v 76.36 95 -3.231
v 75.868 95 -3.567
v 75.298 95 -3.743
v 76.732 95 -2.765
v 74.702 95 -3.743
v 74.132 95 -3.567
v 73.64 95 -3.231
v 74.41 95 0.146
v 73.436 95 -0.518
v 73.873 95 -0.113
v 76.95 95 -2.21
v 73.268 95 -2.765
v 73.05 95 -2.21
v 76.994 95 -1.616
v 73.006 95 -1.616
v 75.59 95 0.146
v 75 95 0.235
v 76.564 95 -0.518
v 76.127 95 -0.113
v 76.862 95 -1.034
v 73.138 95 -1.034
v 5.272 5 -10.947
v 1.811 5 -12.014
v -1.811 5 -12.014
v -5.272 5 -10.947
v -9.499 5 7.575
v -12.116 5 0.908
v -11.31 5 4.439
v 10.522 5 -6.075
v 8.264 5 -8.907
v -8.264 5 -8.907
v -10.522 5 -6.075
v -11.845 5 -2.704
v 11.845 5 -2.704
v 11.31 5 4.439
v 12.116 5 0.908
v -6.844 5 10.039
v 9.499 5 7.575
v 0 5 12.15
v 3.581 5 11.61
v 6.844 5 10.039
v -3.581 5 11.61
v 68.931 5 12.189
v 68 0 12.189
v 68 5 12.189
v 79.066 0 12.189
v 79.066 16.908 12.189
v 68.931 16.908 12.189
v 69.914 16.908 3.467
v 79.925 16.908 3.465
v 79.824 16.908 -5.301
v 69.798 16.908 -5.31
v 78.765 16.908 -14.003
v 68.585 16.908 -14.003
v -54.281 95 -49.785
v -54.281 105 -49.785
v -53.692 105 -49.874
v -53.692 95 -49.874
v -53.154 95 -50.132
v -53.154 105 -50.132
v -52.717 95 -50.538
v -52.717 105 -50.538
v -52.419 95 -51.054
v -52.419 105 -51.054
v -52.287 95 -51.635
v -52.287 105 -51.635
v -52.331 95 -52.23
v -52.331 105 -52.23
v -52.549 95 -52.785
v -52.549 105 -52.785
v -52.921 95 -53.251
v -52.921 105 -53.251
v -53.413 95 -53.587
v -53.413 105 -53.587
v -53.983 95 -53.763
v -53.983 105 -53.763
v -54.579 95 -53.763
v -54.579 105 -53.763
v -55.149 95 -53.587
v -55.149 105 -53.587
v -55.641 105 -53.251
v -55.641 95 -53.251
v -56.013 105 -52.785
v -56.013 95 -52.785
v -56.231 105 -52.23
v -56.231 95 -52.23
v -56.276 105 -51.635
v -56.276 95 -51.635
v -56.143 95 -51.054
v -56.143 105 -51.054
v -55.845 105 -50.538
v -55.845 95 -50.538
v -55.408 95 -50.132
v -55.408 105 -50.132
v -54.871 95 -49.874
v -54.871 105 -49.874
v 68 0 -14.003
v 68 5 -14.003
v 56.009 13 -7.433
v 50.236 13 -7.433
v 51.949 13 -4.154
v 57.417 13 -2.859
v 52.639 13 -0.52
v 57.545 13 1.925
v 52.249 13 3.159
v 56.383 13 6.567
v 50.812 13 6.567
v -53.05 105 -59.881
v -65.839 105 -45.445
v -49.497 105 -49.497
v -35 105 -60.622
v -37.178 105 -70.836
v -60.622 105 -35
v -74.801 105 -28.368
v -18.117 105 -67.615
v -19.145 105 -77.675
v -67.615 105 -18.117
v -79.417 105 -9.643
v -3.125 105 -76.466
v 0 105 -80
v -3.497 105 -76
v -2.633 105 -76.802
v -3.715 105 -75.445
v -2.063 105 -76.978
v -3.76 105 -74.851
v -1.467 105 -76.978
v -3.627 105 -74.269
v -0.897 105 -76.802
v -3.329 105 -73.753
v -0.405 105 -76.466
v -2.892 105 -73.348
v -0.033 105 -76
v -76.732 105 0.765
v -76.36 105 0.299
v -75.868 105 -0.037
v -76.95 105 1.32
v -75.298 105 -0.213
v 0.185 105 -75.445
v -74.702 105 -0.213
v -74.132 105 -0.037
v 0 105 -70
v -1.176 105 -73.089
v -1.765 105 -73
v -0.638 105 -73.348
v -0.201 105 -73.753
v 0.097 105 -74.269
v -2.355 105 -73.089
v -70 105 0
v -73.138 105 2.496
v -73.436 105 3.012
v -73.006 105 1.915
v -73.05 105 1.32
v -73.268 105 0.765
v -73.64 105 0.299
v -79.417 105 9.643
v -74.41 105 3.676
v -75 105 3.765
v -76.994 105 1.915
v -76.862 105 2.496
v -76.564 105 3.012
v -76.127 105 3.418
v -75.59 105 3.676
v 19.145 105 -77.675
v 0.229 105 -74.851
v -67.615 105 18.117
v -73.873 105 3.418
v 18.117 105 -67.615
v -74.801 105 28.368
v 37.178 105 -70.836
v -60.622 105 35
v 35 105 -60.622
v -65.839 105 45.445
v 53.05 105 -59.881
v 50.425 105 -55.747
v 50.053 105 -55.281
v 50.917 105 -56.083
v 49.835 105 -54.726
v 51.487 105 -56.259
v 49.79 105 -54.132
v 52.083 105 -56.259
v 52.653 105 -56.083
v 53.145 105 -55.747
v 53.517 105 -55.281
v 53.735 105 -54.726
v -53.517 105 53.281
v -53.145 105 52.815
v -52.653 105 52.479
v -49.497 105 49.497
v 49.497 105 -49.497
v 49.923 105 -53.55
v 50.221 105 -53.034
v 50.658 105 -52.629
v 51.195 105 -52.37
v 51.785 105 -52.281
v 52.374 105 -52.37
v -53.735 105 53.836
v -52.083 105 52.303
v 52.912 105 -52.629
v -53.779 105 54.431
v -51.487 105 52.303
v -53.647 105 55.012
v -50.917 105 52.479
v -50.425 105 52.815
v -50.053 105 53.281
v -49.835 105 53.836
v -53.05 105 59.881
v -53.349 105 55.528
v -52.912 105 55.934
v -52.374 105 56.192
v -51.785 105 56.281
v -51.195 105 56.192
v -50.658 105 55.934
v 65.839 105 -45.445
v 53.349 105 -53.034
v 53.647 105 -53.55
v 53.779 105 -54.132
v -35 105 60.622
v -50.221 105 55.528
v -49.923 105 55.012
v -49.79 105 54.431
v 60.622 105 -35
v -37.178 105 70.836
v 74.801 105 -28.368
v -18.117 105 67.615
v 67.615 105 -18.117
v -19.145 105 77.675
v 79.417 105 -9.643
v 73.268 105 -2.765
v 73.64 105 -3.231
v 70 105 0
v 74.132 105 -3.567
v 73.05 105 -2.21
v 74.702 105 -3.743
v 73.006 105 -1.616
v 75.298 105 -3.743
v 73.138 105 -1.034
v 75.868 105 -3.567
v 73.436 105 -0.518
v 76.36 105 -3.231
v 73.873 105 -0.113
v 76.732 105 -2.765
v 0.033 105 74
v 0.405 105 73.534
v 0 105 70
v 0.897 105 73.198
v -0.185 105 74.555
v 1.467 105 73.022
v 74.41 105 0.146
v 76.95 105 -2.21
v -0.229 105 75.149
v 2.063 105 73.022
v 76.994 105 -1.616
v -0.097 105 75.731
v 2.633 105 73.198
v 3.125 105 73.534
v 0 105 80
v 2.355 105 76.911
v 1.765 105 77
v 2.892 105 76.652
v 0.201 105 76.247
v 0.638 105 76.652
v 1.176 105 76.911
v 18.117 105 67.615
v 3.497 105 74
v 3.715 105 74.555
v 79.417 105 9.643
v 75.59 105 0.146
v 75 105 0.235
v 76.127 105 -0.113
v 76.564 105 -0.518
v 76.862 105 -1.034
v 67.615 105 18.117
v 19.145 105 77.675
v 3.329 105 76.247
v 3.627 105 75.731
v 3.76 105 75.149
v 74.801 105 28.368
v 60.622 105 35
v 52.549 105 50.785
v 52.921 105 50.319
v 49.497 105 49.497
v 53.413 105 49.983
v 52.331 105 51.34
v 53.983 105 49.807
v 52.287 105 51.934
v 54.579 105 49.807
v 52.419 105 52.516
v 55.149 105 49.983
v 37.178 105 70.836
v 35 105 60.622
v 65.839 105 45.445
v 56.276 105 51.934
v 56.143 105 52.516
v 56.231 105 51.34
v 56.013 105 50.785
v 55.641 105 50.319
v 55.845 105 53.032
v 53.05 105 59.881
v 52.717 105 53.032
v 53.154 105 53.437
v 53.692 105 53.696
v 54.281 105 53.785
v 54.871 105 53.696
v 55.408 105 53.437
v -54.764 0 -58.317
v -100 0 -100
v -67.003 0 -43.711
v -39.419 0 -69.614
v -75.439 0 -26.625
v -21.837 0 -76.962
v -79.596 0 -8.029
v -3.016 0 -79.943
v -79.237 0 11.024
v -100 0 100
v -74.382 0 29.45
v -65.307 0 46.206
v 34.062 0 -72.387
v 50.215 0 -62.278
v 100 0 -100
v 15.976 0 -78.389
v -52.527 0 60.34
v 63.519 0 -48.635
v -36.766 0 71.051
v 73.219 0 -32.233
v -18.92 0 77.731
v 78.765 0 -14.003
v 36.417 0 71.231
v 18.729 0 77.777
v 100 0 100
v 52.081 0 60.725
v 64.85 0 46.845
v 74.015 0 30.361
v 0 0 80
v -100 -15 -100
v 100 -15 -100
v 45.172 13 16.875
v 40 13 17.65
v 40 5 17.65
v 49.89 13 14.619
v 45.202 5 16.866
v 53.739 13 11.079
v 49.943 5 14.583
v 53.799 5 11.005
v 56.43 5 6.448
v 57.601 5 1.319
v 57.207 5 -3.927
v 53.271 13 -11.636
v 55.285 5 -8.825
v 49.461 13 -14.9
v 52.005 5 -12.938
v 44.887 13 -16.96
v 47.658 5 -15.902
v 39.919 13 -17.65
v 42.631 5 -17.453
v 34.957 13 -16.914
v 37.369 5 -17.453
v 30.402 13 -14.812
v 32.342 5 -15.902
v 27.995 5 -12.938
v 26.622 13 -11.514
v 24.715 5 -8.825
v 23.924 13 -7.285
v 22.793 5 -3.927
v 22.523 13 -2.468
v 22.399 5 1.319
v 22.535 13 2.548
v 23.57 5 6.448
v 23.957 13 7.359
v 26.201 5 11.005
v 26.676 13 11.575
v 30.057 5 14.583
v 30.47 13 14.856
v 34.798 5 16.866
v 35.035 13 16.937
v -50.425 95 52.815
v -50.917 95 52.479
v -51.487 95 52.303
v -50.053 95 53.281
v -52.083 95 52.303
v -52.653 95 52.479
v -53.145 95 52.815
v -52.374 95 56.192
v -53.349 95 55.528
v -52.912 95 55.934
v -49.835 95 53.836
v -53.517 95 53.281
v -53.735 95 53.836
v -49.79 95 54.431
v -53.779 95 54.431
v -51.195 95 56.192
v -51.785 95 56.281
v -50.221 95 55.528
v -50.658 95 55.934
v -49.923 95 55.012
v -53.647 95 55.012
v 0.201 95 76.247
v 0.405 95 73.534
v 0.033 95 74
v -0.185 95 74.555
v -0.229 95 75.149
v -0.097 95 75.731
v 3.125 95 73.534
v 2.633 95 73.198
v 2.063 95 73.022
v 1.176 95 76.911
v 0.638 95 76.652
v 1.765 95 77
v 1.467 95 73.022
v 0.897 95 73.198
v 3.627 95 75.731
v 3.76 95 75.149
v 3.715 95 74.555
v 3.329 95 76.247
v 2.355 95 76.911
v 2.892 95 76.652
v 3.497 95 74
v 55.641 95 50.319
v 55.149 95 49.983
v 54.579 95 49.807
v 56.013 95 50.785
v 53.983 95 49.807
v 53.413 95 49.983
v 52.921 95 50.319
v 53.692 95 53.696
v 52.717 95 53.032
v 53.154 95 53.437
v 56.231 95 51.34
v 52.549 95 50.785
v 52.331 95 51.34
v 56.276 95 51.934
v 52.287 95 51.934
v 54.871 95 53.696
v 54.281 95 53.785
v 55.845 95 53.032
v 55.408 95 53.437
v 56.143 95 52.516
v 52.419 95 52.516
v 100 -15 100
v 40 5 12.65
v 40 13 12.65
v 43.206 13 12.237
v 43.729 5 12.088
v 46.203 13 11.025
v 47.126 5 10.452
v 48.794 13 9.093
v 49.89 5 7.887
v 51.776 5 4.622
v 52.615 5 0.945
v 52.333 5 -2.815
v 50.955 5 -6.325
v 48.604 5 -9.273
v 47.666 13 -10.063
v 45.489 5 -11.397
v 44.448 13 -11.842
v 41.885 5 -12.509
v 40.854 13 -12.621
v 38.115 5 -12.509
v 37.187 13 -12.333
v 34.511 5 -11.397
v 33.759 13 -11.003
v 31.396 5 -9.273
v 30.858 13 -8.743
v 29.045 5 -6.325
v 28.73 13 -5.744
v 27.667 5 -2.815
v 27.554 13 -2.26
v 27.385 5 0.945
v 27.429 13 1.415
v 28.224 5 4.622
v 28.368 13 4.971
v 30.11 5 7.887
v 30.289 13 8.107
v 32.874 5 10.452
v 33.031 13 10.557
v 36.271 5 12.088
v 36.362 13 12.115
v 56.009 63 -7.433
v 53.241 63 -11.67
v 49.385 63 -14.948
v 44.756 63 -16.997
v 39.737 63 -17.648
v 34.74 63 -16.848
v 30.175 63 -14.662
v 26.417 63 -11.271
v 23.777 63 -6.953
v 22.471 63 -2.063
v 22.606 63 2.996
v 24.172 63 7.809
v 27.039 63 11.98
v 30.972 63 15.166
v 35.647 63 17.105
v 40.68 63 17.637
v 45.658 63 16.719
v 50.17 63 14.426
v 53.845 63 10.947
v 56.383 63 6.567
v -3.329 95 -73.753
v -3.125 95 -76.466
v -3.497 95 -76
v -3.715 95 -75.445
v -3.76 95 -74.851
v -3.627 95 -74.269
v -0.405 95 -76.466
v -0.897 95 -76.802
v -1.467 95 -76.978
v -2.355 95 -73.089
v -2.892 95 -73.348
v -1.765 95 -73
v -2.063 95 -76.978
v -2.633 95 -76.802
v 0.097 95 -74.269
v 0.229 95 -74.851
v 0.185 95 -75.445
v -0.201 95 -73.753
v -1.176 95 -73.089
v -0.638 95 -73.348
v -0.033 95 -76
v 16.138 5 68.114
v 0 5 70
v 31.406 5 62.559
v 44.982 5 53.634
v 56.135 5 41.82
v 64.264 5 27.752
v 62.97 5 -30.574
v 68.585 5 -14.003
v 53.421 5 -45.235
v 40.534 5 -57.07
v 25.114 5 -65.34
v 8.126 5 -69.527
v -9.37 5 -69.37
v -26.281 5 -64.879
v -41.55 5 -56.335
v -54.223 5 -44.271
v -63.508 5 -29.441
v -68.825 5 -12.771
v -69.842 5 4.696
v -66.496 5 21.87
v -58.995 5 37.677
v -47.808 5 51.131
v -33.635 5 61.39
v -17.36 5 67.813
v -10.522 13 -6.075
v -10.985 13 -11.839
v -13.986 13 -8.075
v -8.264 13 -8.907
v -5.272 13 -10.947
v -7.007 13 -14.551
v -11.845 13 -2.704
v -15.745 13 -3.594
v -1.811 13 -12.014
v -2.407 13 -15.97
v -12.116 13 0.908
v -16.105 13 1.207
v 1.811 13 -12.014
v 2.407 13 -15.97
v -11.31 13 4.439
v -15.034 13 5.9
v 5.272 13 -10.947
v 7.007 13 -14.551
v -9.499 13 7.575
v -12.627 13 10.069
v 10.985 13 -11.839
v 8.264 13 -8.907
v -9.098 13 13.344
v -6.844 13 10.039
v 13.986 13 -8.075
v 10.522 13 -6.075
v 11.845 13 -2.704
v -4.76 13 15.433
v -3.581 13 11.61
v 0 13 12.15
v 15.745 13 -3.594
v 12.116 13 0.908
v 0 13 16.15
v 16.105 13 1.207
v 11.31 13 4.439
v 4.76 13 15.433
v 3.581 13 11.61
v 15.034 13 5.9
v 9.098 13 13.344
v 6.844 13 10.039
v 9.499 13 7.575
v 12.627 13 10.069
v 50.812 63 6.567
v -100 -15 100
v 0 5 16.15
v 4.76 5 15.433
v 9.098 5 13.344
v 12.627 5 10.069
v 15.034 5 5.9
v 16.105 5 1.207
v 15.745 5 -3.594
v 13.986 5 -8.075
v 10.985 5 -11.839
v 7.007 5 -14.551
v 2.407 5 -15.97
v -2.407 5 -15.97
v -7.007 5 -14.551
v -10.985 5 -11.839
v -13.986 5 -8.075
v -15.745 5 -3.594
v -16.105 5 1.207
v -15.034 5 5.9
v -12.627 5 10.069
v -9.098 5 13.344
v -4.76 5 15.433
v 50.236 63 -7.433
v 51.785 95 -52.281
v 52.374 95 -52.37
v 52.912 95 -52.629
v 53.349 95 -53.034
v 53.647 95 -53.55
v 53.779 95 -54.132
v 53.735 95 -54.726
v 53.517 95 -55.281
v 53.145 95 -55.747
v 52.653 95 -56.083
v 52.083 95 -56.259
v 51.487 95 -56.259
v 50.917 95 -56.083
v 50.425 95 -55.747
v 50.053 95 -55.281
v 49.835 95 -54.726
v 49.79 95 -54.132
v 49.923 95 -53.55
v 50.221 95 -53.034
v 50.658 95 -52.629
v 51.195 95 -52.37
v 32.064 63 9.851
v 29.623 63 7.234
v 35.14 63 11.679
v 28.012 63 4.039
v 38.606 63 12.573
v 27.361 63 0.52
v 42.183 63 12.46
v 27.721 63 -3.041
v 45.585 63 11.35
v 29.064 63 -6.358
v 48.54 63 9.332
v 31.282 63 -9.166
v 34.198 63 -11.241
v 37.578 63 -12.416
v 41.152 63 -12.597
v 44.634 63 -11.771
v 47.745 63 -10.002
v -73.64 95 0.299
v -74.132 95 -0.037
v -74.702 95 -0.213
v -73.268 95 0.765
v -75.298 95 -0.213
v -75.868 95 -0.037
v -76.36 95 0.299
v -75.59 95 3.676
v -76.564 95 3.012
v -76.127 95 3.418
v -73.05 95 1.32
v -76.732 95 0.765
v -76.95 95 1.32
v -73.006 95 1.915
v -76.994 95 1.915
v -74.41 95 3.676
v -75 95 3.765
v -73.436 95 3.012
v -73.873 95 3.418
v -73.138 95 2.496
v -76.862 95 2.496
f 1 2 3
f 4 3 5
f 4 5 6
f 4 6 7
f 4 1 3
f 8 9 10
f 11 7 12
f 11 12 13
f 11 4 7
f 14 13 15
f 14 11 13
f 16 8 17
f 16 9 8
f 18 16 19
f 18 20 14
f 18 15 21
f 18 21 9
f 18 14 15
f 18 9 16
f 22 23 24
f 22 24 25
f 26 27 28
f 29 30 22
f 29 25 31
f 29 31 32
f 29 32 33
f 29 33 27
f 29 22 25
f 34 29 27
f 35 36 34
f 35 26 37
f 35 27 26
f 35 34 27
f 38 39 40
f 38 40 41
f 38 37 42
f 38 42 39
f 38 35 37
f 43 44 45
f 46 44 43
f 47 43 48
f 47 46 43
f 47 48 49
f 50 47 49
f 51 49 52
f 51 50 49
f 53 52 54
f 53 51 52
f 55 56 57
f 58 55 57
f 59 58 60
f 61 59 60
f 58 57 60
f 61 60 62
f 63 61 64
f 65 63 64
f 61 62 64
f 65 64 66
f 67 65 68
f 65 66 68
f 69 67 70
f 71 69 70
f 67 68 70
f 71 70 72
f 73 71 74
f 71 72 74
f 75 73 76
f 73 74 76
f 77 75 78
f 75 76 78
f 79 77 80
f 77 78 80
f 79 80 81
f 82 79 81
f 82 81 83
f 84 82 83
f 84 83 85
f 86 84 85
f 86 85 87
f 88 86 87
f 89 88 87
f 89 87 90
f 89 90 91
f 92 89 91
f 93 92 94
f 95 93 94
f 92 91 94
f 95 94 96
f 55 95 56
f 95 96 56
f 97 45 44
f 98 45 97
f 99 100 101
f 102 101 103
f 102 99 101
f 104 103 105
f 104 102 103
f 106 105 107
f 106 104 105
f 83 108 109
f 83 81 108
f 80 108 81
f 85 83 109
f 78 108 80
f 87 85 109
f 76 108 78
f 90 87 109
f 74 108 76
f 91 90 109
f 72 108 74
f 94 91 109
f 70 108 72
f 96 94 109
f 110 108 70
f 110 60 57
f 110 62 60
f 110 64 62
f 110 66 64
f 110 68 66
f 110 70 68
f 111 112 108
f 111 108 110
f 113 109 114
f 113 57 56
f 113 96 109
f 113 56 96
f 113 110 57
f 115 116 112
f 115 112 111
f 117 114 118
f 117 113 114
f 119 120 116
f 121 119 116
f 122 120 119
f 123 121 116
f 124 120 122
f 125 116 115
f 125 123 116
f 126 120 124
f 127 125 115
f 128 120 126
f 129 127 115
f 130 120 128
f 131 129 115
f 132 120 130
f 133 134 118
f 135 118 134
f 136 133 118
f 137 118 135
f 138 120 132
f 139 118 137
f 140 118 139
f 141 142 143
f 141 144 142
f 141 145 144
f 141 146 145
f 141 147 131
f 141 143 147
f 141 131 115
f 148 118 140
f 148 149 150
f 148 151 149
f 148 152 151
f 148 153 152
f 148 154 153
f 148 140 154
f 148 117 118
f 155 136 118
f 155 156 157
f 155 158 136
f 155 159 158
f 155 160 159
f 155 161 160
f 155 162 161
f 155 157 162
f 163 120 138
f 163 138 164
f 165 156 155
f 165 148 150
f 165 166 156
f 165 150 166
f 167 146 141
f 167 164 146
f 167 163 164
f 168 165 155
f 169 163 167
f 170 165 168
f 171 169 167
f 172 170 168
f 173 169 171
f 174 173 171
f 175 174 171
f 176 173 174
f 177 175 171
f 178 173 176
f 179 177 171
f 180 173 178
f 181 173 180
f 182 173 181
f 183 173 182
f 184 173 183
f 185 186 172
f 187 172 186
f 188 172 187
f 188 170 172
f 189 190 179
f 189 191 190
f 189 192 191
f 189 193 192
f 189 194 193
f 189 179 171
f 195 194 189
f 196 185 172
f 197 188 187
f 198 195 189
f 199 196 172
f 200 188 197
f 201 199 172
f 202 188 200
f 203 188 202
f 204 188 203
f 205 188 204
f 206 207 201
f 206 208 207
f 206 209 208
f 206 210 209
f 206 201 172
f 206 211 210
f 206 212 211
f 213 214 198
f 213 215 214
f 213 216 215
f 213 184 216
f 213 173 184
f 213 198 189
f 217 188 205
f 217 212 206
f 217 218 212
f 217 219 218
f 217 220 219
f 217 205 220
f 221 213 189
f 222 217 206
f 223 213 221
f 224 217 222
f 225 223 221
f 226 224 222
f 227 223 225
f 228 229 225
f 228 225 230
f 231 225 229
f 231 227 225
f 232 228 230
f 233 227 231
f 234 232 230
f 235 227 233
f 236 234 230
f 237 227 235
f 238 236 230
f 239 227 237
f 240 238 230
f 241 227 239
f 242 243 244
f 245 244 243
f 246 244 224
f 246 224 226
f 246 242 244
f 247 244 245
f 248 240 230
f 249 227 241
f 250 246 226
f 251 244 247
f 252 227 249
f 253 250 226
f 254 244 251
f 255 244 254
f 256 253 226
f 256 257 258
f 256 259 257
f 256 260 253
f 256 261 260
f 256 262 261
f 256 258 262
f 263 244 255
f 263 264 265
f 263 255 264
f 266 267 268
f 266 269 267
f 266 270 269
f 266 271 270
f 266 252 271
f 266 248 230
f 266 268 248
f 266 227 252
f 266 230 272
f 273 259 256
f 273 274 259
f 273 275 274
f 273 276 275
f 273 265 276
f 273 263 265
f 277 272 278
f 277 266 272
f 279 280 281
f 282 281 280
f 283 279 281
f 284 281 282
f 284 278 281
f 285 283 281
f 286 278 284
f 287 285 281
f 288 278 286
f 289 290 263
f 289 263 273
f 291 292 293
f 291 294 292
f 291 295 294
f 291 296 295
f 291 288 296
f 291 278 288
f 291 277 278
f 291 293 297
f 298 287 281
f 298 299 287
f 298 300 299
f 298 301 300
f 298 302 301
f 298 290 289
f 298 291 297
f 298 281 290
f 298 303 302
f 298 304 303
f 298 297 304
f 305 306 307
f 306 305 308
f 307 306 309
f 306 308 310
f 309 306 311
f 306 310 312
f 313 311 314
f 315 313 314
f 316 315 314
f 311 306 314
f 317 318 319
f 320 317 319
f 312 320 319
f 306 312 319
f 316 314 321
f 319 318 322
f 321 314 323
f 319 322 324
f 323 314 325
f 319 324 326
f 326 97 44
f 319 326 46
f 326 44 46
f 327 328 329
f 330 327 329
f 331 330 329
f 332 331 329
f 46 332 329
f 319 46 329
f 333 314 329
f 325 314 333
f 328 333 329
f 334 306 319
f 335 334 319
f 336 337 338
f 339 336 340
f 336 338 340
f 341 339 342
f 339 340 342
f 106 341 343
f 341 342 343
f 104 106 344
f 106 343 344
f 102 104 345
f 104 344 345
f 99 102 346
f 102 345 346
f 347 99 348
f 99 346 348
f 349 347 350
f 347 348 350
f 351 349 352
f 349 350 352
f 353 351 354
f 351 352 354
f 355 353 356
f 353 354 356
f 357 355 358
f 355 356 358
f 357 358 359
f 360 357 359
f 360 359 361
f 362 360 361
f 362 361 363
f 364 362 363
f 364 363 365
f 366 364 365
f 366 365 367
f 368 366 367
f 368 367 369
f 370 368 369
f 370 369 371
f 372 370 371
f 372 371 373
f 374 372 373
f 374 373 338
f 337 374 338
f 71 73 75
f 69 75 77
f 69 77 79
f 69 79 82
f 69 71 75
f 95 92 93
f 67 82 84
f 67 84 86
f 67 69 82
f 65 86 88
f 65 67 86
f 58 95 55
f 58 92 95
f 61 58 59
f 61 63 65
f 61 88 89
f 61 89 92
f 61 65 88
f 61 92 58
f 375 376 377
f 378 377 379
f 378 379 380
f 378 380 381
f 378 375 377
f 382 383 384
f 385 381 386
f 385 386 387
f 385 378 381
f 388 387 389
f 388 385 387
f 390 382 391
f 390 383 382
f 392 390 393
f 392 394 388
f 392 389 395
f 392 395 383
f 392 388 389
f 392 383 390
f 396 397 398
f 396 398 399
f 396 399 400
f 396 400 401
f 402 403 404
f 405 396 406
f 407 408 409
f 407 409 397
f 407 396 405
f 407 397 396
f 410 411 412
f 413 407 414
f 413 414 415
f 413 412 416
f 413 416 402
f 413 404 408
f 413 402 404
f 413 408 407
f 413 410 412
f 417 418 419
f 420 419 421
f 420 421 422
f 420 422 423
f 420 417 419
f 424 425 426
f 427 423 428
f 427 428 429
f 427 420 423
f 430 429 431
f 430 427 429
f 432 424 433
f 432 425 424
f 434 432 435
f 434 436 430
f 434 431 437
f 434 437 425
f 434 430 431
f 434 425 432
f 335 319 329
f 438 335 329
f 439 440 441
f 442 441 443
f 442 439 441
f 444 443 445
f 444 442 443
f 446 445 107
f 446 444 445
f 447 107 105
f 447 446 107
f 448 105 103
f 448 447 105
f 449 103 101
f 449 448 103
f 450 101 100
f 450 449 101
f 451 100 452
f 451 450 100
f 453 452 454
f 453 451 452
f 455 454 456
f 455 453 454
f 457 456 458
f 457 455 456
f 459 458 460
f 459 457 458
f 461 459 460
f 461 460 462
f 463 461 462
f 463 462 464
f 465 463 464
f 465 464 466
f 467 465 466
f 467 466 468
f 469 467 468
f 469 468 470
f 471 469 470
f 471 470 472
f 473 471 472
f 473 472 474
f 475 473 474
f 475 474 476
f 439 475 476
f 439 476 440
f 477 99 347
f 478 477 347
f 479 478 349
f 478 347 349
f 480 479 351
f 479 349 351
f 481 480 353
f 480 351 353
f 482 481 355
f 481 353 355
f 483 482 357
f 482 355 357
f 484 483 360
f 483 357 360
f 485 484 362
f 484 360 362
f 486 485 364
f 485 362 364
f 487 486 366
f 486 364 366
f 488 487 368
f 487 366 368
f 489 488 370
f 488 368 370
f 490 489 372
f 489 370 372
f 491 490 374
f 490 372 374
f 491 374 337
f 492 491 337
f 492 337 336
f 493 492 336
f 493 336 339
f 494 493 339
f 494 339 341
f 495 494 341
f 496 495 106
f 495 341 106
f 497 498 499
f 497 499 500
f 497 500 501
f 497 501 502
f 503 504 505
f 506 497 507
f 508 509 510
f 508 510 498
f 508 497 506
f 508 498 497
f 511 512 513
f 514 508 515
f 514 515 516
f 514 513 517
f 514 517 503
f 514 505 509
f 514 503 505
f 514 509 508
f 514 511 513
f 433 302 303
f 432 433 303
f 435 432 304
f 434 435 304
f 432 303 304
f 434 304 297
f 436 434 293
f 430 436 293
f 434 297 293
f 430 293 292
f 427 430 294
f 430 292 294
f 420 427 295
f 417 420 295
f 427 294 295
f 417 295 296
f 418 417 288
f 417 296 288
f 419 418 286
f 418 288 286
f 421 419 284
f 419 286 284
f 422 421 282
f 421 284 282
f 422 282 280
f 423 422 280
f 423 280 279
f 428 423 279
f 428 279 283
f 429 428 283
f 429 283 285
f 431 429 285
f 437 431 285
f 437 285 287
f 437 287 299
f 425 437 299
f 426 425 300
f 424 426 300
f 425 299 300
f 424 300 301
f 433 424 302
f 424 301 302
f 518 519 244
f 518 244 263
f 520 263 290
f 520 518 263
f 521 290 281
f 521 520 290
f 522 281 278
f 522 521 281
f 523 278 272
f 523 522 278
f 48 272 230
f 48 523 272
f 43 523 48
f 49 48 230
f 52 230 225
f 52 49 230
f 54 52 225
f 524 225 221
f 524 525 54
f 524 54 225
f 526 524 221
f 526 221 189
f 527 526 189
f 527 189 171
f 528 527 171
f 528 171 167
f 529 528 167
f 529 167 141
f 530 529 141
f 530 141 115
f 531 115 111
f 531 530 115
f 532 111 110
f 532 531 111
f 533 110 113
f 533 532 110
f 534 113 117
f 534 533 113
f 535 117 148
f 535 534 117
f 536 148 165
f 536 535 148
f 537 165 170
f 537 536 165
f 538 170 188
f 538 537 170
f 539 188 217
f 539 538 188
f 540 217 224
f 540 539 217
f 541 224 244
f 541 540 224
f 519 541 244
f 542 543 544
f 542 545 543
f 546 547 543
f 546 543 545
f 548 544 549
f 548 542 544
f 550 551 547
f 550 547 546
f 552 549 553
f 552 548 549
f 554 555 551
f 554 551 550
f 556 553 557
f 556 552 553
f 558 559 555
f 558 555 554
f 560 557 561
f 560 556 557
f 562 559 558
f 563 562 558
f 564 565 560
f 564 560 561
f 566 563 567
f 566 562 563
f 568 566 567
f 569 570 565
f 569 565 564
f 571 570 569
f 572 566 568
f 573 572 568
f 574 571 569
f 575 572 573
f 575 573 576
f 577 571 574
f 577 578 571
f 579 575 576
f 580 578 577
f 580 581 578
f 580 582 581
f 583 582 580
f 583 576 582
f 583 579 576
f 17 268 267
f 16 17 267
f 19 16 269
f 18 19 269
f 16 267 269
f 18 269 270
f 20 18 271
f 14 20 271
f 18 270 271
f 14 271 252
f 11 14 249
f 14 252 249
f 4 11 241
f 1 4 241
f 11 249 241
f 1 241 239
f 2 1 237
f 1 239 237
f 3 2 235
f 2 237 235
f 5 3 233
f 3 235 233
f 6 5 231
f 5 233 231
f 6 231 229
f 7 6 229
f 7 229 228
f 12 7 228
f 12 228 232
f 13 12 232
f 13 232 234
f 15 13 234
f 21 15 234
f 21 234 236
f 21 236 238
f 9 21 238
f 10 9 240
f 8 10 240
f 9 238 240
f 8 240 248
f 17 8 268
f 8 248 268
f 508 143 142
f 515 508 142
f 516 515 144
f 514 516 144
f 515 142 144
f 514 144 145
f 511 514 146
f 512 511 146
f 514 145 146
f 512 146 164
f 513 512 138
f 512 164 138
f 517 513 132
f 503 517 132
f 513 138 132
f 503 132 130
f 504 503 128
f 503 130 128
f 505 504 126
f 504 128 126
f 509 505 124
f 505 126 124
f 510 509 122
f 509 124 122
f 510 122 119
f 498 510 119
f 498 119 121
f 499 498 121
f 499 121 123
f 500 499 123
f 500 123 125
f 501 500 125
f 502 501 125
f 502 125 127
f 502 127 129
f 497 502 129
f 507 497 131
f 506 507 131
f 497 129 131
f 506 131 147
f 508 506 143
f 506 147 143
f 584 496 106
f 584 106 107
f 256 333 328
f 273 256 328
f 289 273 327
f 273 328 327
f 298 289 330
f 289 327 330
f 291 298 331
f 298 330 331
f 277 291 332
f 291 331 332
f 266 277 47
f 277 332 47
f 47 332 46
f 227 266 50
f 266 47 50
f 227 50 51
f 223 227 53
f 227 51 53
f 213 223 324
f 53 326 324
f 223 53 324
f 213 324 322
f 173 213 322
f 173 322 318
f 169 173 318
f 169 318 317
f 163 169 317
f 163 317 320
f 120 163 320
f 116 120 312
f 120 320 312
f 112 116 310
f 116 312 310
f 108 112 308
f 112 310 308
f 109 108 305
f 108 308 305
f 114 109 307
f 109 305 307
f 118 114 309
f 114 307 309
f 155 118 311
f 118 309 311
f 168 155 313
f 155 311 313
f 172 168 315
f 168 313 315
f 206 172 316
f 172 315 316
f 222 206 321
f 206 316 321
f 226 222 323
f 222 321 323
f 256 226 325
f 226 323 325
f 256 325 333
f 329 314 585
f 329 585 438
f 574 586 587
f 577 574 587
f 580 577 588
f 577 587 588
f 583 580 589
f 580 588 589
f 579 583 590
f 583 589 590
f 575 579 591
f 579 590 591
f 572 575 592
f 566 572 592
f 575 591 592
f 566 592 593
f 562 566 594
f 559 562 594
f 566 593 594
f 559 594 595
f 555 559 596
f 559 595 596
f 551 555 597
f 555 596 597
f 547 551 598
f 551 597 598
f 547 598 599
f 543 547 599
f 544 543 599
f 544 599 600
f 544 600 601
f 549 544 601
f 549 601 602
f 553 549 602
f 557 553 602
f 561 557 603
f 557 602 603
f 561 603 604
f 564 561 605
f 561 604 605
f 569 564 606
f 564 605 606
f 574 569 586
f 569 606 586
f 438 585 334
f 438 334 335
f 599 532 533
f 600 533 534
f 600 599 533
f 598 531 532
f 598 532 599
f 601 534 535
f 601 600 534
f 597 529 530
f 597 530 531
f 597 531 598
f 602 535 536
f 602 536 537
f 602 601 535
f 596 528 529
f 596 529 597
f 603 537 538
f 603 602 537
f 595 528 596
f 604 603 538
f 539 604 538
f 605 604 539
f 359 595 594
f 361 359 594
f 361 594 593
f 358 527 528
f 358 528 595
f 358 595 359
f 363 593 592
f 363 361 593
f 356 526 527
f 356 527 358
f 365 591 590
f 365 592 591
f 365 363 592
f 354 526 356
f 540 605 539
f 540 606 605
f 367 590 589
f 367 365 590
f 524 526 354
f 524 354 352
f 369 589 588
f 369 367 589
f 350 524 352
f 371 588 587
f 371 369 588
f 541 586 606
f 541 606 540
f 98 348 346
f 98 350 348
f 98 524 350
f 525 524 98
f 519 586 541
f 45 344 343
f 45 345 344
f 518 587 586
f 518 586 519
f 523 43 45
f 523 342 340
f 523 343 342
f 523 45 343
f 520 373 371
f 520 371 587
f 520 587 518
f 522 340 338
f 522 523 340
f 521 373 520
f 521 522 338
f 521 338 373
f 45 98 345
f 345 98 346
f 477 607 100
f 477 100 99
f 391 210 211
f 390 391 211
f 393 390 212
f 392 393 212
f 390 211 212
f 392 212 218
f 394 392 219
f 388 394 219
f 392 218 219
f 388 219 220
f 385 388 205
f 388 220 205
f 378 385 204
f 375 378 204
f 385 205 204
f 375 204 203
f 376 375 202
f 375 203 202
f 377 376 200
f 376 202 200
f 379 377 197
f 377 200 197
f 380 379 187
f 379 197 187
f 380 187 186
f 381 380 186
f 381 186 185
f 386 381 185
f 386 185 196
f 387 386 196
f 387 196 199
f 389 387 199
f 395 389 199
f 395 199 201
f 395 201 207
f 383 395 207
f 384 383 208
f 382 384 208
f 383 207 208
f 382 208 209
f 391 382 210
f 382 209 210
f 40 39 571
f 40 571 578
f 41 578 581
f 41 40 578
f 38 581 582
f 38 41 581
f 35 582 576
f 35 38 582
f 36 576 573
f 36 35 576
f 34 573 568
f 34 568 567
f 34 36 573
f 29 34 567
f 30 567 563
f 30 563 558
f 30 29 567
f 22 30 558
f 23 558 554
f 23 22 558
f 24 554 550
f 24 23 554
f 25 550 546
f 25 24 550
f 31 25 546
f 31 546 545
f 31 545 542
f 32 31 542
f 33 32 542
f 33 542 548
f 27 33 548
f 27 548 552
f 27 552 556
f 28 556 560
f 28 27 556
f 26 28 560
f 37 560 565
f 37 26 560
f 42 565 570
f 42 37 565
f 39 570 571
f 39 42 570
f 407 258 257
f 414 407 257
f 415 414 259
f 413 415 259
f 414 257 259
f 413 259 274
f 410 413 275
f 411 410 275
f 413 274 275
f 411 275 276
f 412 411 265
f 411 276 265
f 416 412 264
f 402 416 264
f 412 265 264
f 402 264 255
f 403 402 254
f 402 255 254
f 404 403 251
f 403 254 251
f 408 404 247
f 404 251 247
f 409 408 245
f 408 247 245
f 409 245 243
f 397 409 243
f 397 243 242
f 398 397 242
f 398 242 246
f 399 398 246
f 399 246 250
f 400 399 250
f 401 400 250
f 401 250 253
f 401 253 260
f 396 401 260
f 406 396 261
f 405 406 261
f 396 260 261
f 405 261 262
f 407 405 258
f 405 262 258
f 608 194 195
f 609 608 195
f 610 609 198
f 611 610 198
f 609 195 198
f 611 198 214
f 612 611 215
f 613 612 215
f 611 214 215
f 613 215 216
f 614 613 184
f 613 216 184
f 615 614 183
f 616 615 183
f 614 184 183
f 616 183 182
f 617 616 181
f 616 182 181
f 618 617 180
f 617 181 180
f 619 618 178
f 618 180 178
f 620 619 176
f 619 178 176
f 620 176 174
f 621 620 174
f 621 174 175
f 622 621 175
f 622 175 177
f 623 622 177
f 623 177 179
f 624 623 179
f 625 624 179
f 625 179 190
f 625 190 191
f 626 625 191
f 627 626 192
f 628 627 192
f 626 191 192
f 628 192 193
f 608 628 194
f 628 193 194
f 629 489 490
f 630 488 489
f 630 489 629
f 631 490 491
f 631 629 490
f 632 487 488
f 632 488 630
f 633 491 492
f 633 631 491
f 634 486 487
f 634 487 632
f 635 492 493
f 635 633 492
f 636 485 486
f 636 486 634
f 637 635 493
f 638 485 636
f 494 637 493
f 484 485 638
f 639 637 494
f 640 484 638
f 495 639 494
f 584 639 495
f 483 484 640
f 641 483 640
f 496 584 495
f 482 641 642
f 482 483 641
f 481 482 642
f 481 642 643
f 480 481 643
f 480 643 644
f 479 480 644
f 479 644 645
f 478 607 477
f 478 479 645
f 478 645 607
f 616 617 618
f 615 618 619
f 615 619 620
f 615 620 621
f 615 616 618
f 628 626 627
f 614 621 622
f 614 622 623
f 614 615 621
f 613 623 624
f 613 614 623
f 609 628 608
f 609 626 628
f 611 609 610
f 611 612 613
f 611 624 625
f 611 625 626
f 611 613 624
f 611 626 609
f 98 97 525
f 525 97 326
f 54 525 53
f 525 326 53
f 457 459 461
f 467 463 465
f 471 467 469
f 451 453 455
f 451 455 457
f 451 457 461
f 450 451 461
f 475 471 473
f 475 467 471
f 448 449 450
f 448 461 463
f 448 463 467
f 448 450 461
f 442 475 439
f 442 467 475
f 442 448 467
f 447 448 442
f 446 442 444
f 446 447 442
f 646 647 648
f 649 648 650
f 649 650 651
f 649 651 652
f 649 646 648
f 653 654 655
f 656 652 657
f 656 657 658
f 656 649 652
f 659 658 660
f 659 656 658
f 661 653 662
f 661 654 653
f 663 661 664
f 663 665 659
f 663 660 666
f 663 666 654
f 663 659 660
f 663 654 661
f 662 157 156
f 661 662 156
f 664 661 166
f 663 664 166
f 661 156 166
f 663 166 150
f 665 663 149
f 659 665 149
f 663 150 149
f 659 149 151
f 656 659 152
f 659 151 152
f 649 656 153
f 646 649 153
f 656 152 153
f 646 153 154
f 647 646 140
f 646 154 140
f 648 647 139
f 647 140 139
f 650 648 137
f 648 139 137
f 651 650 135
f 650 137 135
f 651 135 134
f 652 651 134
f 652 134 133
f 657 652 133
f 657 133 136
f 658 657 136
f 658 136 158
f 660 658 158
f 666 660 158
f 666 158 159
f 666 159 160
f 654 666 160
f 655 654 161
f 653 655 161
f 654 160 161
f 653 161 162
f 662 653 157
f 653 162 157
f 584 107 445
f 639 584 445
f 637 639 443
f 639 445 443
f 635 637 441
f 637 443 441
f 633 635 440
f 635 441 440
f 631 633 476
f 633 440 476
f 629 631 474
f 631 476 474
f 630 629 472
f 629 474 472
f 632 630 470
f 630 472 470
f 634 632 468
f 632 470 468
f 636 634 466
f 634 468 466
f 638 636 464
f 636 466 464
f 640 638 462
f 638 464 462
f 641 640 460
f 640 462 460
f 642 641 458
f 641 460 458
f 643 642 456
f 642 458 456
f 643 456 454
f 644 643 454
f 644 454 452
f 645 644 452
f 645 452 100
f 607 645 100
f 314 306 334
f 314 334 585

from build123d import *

# Parameters (mm, degrees)
CROQUIS1_R              = 80
SALIENTE_EXTRUIR1_DEPTH = 5
CROQUIS2_R              = 80
CROQUIS2_R_2            = 70
SALIENTE_EXTRUIR2_DEPTH = 100
CROQUIS3_R              = 16.15
CROQUIS3_R_2            = 12.15
CROQUIS3_R_3            = 17.65
CROQUIS3_R_4            = 12.65
SALIENTE_EXTRUIR3_DEPTH = 8
SALIENTE_EXTRUIR4_DEPTH = 50
CROQUIS6_W              = 200
CROQUIS6_H              = 200
SALIENTE_EXTRUIR5_DEPTH = 15
CROQUIS8_W              = 26.192306131
CROQUIS8_H              = 16.90838964
CORTAR_EXTRUIR1_DEPTH   = 32
CROQUIS9_R              = 2
CORTAR_EXTRUIR2_DEPTH   = 10


with BuildPart() as part:
    # Croquis1 → Saliente-Extruir1 (new body)
    with BuildSketch(Plane(origin=(0, 0, 0), x_dir=(1, 0, 0), z_dir=(0, 1, 0))):
        with Locations(Location((0, 0, 0), (0, 0, 270))):
            Circle(CROQUIS1_R)
    extrude(amount=SALIENTE_EXTRUIR1_DEPTH)

    # Croquis2 → Saliente-Extruir2 (add)
    with BuildSketch(Plane(origin=(0, 5, 0), x_dir=(1, 0, 0), z_dir=(0, 1, 0))):
        with Locations(Location((0, 0, 0), (0, 0, 270))):
            Circle(CROQUIS2_R)
        with Locations(Location((0, 0, 0), (0, 0, 270))):
            Circle(CROQUIS2_R_2, mode=Mode.SUBTRACT)
    extrude(amount=SALIENTE_EXTRUIR2_DEPTH)

    # Croquis3 → Saliente-Extruir3 (add)
    # profile 1 of 2: a face of its own
    with BuildSketch(Plane(origin=(0, 5, 0), x_dir=(1, 0, 0), z_dir=(0, 1, 0))):
        with Locations(Location((0, 0, 0), (0, 0, 270))):
            Circle(CROQUIS3_R)
        with Locations(Location((0, 0, 0), (0, 0, 270))):
            Circle(CROQUIS3_R_2, mode=Mode.SUBTRACT)
    # profile 2 of 2: a face of its own
    with BuildSketch(Plane(origin=(0, 5, 0), x_dir=(1, 0, 0), z_dir=(0, 1, 0))):
        with Locations(Location((40, 0, 0), (0, 0, 270))):
            Circle(CROQUIS3_R_3)
        with Locations(Location((40, 0, 0), (0, 0, 270))):
            Circle(CROQUIS3_R_4, mode=Mode.SUBTRACT)
    extrude(amount=SALIENTE_EXTRUIR3_DEPTH)

    # Croquis5 → Saliente-Extruir4 (add)
    with BuildSketch(Plane(origin=(0, 13, 0), x_dir=(1, 0, 0), z_dir=(0, 1, 0))):
        with BuildLine():
            Line((50.235999238, 7.432820433), (56.008612695, 7.432820433))
            ThreePointArc((56.008612695, 7.432820433), (22.356299399, -0.471517861), (56.38275473, -6.567179567))
            Line((56.38275473, -6.567179567), (50.811783041, -6.567179567))
            ThreePointArc((50.811783041, -6.567179567), (27.360684958, -0.519822349), (50.235999238, 7.432820433))
        make_face()
    extrude(amount=SALIENTE_EXTRUIR4_DEPTH)

    # Croquis6 → Saliente-Extruir5 (add)
    with BuildSketch(Plane.XZ):
        Rectangle(CROQUIS6_W, CROQUIS6_H)
    extrude(amount=SALIENTE_EXTRUIR5_DEPTH)

    # Croquis8 → Cortar-Extruir1 (cut)
    with BuildSketch(Plane(origin=(100, 0, 0), x_dir=(0, 0, -1), z_dir=(1, 0, 0))):
        with Locations((0.906775278, 8.45419482)):
            Rectangle(CROQUIS8_W, CROQUIS8_H)
    extrude(amount=-CORTAR_EXTRUIR1_DEPTH, mode=Mode.SUBTRACT)

    # Croquis9 → Cortar-Extruir2 (cut)
    with BuildSketch(Plane(origin=(0, 105, 0), x_dir=(1, 0, 0), z_dir=(0, 1, 0))):
        with Locations(Location((-54.281139298, 51.78487788, 0), (0, 0, 270))):
            Circle(CROQUIS9_R)
        with Locations(Location((-1.765123376, 75, 0), (0, 0, 270))):
            Circle(CROQUIS9_R)
        with Locations(Location((-51.78487788, -54.281139298, 0), (0, 0, 270))):
            Circle(CROQUIS9_R)
        with Locations(Location((75, 1.765123376, 0), (0, 0, 270))):
            Circle(CROQUIS9_R)
        with Locations(Location((-75, -1.765123376, 0), (0, 0, 270))):
            Circle(CROQUIS9_R)
        with Locations(Location((1.765123376, -75, 0), (0, 0, 270))):
            Circle(CROQUIS9_R)
        with Locations(Location((54.281139298, -51.78487788, 0), (0, 0, 270))):
            Circle(CROQUIS9_R)
        with Locations(Location((51.78487788, 54.281139298, 0), (0, 0, 270))):
            Circle(CROQUIS9_R)
    extrude(amount=-CORTAR_EXTRUIR2_DEPTH, mode=Mode.SUBTRACT)


solid = part.part
